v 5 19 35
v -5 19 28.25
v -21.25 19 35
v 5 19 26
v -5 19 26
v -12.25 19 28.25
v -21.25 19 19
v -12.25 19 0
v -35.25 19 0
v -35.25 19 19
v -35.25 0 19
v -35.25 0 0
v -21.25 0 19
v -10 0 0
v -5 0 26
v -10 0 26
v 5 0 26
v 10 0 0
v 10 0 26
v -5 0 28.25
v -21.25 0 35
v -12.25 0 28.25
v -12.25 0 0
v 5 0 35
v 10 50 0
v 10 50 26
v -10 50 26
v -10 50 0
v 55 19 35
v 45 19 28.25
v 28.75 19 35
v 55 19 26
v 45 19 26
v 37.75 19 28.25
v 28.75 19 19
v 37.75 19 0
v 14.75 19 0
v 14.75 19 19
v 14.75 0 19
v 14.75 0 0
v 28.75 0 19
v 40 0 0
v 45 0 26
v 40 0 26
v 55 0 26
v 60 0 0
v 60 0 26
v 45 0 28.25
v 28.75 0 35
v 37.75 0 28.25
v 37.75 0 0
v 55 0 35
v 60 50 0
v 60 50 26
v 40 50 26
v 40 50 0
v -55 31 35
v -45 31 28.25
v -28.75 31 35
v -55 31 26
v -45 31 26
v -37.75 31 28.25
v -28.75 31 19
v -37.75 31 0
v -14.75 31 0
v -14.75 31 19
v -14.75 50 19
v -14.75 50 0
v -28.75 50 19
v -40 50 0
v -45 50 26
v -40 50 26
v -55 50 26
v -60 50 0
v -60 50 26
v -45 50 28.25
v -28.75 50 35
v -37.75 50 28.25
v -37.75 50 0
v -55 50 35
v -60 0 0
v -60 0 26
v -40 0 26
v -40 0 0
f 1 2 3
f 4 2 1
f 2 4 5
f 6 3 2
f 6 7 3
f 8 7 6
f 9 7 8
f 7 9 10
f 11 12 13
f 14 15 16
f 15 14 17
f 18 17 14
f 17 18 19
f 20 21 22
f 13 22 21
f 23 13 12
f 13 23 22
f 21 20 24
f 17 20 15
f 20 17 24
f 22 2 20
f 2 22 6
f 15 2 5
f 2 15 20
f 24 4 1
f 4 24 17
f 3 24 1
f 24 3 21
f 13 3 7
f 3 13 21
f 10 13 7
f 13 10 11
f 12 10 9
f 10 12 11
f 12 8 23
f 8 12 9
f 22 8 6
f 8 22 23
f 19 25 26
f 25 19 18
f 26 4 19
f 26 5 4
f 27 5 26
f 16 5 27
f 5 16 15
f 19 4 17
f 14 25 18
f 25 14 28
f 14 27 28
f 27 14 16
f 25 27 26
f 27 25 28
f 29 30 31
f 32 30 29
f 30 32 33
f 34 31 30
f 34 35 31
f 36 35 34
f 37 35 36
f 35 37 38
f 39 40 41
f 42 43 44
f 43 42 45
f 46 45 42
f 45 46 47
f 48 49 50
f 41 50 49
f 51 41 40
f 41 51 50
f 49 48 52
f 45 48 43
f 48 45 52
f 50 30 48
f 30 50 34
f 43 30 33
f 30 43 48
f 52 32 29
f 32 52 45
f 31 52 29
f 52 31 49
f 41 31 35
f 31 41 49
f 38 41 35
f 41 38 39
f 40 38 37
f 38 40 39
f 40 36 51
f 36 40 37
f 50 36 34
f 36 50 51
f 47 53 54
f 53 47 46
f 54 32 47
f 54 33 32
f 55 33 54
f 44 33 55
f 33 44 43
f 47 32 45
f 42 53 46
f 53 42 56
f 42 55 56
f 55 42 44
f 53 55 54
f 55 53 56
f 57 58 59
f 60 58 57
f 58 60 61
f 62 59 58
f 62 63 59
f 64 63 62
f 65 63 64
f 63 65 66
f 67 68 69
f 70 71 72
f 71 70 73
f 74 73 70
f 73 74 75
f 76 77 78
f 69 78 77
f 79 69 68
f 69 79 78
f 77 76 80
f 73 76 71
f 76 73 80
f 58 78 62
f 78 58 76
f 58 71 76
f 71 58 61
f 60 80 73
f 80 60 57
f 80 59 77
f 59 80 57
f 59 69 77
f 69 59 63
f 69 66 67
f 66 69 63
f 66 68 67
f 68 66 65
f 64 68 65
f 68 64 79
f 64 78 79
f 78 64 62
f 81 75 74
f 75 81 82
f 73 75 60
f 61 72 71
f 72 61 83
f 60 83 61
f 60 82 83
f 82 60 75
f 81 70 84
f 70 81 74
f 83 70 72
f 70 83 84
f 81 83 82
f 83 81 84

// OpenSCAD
sheet_thickness = 19;
laser_height = 26;
laser_width = 20;
laser_length = 50;

module laser_clamp( p ) {
    clearance = 10;
    clamp_thickness = clearance - 1;
    foot_length = 14 + clamp_thickness;
    border = 2.25;
    pad = 10;
    overlap = 0.25;
    
    laser_clamp_points = [
        [0,0],
        [foot_length, 0],
        [foot_length, laser_height + border],
        [foot_length + border + laser_width/2 - pad/2, laser_height + border],
        [foot_length + border + laser_width/2 - pad/2, laser_height - overlap],
        [foot_length + border + laser_width/2 + pad/2, laser_height - overlap],
        [foot_length + border + laser_width/2 + pad/2, laser_height + clamp_thickness],
        [foot_length - border - clamp_thickness + border, laser_height + clamp_thickness],
        [foot_length - border - clamp_thickness + border, sheet_thickness],    
        [0, sheet_thickness],    
    ];
    echo( laser_clamp_points=laser_clamp_points );
    pad_middle = laser_clamp_points[5][0] - pad/2;
    
    translate( p ) {
        color( [1,1,1] )
        translate( [0,0,0] )
        translate( [-pad_middle,sheet_thickness,0] )
        rotate( [90,0,0] )
        linear_extrude( height=sheet_thickness )
        polygon( laser_clamp_points );
        
        color( [1,.5,0] )
        translate( [-laser_width/2, 0, 0] )
        cube( [laser_width, laser_length, laser_height] );
    }
}

laser_clamp( [0,0,0] );
laser_clamp( [50,0,0] );
translate( [0, laser_length, 0] )
rotate( [0,0,180] )
laser_clamp( [50,0,0] );
